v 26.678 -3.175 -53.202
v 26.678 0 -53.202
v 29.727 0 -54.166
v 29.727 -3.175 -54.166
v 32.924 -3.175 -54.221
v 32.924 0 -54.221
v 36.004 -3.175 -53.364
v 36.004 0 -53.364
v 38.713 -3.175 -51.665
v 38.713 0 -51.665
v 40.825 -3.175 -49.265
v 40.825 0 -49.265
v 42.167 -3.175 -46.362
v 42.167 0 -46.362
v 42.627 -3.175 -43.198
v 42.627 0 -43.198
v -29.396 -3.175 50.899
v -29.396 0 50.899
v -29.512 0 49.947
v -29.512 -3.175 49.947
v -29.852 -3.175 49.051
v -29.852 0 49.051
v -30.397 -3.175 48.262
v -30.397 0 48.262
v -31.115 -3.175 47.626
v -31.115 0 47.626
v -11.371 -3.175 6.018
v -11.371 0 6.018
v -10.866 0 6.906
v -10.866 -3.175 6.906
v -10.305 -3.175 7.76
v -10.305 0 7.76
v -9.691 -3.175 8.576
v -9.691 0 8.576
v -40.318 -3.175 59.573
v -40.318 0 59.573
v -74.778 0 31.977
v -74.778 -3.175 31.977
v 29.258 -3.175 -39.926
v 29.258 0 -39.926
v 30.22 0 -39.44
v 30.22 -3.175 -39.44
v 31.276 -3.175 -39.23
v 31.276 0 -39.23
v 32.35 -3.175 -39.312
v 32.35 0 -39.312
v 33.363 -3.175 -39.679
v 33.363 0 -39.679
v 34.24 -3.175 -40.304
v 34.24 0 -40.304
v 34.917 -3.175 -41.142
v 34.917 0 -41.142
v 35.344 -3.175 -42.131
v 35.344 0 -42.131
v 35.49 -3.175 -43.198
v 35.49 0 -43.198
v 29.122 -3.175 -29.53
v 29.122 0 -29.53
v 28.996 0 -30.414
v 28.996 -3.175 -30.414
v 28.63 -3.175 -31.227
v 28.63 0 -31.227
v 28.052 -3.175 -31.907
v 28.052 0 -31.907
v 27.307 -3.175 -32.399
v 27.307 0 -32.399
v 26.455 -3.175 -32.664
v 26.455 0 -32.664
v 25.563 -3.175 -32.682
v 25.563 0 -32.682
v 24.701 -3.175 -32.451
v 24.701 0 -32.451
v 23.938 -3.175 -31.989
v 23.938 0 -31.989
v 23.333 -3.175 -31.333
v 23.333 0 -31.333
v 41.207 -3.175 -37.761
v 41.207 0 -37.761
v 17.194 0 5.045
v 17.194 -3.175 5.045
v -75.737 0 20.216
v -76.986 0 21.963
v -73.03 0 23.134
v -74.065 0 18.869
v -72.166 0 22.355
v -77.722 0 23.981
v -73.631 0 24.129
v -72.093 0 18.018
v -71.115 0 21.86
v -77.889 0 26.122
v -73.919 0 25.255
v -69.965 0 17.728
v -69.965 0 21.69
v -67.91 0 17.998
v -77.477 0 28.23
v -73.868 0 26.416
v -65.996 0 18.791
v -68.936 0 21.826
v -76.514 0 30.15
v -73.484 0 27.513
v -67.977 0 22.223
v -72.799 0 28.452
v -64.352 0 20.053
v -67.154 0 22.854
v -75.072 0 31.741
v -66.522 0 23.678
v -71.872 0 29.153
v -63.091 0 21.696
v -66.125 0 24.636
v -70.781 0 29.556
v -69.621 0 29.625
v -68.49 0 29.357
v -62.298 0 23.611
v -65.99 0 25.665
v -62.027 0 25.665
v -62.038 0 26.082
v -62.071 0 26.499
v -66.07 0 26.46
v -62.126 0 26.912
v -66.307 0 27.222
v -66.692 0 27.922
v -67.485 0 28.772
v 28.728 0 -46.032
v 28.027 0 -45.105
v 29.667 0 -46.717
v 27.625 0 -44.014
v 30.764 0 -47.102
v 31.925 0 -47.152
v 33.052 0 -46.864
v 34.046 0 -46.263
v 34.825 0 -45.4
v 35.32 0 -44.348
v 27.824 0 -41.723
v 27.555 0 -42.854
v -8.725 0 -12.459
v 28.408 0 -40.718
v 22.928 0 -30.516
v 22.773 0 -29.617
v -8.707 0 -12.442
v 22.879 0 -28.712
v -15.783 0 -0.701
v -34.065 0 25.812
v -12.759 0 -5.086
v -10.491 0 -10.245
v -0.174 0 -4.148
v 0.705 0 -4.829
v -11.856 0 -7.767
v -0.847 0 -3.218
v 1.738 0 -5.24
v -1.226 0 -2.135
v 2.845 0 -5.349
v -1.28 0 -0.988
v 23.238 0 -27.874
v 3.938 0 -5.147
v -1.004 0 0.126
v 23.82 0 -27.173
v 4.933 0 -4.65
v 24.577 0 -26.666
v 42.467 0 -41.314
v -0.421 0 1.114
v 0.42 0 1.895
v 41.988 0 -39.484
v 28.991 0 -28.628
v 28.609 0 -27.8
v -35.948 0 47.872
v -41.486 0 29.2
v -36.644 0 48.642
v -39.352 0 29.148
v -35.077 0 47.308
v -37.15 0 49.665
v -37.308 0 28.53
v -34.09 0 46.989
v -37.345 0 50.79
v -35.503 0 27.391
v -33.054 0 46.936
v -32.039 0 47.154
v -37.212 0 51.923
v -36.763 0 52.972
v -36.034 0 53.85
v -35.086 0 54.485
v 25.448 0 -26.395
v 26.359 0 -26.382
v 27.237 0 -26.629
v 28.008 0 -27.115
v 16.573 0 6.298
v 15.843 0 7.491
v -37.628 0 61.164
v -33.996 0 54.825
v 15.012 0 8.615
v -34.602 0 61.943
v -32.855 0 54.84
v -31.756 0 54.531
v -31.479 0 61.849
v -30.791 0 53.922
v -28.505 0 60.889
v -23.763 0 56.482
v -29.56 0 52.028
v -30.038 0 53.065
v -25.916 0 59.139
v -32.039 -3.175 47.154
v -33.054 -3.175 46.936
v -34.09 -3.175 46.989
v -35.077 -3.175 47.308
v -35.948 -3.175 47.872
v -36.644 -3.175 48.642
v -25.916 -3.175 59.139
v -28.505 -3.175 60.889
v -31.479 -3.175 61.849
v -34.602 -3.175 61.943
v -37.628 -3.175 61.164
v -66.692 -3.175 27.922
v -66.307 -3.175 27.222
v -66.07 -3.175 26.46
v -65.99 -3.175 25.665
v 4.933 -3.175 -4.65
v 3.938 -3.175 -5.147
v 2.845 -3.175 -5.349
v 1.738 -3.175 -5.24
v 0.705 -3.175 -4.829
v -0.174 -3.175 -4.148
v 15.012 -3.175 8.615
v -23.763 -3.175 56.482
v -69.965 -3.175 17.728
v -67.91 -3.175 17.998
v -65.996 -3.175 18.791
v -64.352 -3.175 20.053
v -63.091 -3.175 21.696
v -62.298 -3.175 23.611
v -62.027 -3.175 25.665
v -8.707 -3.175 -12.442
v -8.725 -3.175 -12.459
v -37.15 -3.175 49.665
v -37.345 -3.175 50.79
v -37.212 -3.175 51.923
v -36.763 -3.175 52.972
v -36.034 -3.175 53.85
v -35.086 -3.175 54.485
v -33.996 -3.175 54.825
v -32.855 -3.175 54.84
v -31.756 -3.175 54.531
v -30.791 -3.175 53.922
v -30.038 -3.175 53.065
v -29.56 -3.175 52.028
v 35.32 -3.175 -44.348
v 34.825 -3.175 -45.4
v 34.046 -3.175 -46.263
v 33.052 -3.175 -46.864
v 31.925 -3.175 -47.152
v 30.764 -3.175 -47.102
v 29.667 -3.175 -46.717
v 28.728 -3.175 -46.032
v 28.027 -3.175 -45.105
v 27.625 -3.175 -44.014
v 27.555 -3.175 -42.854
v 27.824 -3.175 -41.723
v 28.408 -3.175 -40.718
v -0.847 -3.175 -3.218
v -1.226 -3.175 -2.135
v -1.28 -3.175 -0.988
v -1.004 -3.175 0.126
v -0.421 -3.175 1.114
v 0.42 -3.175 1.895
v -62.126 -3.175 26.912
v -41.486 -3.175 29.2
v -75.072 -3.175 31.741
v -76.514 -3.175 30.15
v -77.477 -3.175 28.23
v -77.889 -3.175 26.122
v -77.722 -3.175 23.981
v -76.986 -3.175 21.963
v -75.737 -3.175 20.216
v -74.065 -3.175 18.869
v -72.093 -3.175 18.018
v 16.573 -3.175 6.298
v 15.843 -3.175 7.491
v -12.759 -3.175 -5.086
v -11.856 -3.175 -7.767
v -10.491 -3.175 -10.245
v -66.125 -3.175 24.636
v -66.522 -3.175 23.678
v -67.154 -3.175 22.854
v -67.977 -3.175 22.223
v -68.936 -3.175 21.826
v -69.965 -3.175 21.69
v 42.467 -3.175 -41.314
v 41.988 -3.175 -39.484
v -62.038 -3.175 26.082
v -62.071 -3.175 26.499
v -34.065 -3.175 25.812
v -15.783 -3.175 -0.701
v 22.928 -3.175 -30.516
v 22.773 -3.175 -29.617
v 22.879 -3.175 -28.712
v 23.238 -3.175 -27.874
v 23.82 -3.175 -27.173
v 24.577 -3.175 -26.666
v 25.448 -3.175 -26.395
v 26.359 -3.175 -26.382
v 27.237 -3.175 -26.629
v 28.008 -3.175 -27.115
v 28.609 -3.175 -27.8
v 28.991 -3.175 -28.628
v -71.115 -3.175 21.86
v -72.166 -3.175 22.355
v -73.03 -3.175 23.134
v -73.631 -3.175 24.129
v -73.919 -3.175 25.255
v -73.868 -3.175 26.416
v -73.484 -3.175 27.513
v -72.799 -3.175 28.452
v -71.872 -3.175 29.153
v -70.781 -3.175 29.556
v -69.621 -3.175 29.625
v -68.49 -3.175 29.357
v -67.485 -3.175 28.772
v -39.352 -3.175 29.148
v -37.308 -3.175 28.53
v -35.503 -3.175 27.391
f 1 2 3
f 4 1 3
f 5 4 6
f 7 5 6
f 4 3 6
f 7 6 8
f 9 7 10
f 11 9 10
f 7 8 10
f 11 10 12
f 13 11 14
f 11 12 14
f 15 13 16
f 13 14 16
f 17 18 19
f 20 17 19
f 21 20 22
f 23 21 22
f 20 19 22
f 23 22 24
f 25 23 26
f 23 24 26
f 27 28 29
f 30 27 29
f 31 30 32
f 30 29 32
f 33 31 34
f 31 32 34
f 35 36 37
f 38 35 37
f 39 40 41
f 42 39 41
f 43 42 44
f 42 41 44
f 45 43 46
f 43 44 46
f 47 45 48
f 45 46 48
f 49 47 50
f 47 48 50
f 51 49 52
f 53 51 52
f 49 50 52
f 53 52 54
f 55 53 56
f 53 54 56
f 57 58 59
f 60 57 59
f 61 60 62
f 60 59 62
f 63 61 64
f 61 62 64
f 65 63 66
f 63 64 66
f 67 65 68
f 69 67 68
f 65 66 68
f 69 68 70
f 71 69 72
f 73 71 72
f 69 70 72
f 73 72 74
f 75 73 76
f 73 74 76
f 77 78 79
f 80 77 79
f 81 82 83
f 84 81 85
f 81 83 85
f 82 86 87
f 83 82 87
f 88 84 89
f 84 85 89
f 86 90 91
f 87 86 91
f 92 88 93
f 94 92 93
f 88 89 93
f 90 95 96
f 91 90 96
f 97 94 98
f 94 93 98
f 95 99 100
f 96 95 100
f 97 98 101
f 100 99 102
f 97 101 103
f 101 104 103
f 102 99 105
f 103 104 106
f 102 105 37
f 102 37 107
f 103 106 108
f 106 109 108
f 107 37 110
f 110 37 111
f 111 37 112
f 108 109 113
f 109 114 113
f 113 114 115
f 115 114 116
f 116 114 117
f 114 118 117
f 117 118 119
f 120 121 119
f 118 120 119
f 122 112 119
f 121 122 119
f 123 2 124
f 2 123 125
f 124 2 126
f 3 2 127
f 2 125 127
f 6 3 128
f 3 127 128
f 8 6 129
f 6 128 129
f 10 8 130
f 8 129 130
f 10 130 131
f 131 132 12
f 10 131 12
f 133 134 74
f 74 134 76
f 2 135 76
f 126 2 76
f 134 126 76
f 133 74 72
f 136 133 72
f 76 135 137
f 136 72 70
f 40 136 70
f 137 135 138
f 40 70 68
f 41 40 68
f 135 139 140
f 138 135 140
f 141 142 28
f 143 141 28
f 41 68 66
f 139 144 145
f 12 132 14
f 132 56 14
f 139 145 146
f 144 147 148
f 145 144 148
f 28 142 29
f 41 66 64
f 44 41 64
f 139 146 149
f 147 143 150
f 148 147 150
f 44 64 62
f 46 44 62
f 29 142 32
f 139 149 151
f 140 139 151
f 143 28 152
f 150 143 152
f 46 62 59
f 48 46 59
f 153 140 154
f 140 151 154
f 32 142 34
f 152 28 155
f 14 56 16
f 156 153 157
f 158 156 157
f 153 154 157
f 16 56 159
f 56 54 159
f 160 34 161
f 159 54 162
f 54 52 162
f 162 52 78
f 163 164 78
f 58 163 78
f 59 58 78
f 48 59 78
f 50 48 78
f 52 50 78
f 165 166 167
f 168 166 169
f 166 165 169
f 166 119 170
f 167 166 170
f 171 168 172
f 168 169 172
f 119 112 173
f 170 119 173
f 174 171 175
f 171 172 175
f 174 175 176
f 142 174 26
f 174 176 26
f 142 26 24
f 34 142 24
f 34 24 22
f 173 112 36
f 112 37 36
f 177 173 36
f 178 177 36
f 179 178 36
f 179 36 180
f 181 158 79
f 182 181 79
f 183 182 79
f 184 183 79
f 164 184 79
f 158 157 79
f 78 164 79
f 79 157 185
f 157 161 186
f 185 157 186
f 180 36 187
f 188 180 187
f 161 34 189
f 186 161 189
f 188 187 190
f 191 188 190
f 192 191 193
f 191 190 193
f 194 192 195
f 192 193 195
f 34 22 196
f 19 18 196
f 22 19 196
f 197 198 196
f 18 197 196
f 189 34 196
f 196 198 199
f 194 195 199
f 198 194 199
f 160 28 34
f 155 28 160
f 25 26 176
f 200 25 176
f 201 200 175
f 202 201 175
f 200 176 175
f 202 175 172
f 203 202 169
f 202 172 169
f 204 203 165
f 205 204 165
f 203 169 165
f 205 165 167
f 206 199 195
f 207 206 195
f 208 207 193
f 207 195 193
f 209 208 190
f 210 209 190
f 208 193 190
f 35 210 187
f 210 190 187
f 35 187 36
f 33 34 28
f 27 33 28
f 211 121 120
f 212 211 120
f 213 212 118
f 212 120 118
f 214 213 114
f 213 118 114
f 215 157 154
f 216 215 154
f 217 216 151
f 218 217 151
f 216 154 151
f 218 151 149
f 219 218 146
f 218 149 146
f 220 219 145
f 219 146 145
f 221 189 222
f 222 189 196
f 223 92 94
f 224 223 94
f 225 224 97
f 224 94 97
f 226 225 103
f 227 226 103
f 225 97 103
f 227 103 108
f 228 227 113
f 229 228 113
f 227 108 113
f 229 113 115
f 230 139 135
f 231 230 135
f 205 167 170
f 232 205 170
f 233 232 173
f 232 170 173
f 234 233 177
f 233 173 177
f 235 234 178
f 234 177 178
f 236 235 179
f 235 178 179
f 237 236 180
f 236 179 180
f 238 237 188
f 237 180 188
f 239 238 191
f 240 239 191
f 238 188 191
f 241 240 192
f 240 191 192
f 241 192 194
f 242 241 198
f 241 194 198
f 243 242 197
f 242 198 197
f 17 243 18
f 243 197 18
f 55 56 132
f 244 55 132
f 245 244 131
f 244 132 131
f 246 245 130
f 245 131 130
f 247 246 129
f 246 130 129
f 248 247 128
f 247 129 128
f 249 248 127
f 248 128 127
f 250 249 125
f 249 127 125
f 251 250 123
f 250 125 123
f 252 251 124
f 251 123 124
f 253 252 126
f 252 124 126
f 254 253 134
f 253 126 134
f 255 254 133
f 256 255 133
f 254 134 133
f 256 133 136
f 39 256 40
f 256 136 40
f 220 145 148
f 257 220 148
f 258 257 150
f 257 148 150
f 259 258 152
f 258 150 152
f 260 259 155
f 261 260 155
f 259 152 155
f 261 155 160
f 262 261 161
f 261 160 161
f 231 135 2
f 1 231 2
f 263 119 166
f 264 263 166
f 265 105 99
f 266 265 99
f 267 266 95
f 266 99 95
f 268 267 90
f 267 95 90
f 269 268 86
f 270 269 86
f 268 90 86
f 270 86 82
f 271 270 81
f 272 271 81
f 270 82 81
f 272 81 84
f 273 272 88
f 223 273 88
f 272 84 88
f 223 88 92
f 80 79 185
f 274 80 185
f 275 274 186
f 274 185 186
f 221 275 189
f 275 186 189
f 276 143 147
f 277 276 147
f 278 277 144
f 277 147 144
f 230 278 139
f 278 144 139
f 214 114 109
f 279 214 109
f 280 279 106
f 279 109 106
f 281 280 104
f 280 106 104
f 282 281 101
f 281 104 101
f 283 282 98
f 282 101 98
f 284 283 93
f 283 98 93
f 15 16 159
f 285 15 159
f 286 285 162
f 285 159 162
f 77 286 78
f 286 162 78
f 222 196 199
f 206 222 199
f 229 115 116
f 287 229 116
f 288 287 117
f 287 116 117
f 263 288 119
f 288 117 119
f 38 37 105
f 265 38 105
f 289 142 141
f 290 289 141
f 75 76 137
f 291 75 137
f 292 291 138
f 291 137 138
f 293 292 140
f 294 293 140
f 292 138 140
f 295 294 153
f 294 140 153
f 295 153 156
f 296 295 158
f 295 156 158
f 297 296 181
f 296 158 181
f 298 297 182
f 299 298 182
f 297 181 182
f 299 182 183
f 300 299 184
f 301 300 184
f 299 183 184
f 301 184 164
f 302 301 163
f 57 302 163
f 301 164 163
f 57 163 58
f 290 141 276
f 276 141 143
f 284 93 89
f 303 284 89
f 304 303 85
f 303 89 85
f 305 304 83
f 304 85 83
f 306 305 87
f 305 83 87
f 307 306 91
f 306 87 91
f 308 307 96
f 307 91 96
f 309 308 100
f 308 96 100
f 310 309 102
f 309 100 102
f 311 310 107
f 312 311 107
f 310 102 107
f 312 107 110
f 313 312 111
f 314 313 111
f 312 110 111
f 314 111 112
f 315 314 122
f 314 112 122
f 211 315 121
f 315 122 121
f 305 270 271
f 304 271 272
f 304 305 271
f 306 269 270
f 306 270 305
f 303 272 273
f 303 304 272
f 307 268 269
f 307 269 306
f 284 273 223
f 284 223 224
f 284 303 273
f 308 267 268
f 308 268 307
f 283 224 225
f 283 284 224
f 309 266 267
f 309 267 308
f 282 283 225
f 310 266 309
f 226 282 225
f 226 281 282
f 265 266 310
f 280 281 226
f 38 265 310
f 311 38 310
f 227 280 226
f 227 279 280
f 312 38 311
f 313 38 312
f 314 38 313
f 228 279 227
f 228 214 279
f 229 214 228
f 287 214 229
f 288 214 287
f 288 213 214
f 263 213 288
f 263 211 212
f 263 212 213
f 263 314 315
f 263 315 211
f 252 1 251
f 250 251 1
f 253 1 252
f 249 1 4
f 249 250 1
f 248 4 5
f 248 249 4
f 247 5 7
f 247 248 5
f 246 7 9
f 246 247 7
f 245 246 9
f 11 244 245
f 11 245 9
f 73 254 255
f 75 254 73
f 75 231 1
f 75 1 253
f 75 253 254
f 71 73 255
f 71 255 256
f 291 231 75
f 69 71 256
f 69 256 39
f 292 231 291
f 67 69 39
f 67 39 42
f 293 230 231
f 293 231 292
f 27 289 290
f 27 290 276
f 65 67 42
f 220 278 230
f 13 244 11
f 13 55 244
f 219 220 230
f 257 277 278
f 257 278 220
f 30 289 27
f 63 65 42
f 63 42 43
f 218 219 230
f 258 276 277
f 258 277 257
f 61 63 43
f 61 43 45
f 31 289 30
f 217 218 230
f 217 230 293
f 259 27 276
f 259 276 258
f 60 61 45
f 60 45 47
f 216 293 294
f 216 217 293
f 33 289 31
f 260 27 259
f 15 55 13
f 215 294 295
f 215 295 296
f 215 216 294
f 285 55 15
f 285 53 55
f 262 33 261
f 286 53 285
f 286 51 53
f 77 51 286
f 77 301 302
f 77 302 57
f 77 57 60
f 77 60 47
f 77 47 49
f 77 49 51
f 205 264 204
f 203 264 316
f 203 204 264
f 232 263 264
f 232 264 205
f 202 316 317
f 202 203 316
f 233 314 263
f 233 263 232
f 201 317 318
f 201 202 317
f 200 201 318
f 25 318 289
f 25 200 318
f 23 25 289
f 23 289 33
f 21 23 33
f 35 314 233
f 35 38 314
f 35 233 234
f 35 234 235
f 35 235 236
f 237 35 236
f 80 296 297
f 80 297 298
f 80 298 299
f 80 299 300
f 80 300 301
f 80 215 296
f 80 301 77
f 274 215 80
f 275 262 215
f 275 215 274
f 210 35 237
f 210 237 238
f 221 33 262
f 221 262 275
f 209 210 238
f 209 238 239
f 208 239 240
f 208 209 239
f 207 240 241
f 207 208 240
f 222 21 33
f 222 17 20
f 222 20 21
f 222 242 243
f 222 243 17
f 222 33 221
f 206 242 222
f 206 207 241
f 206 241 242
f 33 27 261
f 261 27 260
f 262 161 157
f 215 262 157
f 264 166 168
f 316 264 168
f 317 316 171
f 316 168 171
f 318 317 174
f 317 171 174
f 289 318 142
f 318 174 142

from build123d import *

# Parameters (mm, degrees)
F1_DEPTH = 3.175


# Not quite as in the source:
# - a feature names something its author has since deleted; it is built from what else it names


with BuildPart() as f1:
    # F0 (on Front) → F1 (new body)
    with BuildSketch(Plane.XZ):
        with BuildLine():
            ThreePointArc((41.2067680932, -37.761442646), (34.0261463641, -32.3730062039), (25.2065586875, -34.049743787))
            ThreePointArc((25.2065586875, -34.049743787), (20.9962687571, -39.6141258639), (20.9333080978, -46.5915842229))
            Line((20.9333080978, -46.5915842229), (26.6775649821, -53.2024105477))
            ThreePointArc((26.6775649821, -53.2024105477), (37.4197145601, -52.6119623059), (42.6274718911, -43.1980539644))
            ThreePointArc((42.6274718911, -43.1980539644), (42.2664308978, -40.3884658314), (41.2067680932, -37.761442646))
        make_face()
        with BuildLine():
            ThreePointArc((35.4900718911, -43.1980539644), (29.6668415528, -46.7174053624), (29.258362368, -39.9255727238))
            ThreePointArc((29.258362368, -39.9255727238), (33.3631022294, -39.6787025664), (35.4900718911, -43.1980539644))
        make_face(mode=Mode.SUBTRACT)
        with BuildLine():
            ThreePointArc((20.9333080978, -46.5915842229), (20.9962687571, -39.6141258639), (25.2065586875, -34.049743787))
            Line((25.2065586875, -34.049743787), (23.332877686, -31.3325763437))
            Line((23.332877686, -31.3325763437), (11.7179656145, -14.4889082319))
            Line((11.7179656145, -14.4889082319), (0.788153606, -23.4073638243))
            Line((0.788153606, -23.4073638243), (20.9333080978, -46.5915842229))
        make_face()
        with BuildLine():
            Line((23.332877686, -31.3325763437), (25.2065586875, -34.049743787))
            ThreePointArc((25.2065586875, -34.049743787), (34.0261463641, -32.3730062039), (41.2067680932, -37.761442646))
            Line((41.2067680932, -37.761442646), (17.1943117559, 5.0453389137))
            ThreePointArc((17.1943117559, 5.0453389137), (18.2085059877, 1.9049828695), (18.5515115318, -1.377207439))
            ThreePointArc((18.5515115318, -1.377207439), (17.0177668978, -8.1848516369), (12.7128948986, -13.6770706055))
            Line((12.7128948986, -13.6770706055), (11.7179656145, -14.4889082319))
            Line((11.7179656145, -14.4889082319), (23.332877686, -31.3325763437))
        make_face()
        with BuildLine():
            ThreePointArc((29.1216807586, -29.5301728102), (26.8905558151, -32.5616287109), (23.332877686, -31.3325763437))
            ThreePointArc((23.332877686, -31.3325763437), (25.0028057021, -26.4987169095), (29.1216807586, -29.5301728102))
        make_face(mode=Mode.SUBTRACT)
        with BuildLine():
            Line((0.788153606, -23.4073638243), (11.7179656145, -14.4889082319))
            Line((11.7179656145, -14.4889082319), (11.6885303941, -14.4462219782))
            ThreePointArc((11.6885303941, -14.4462219782), (1.1239010077, -17.1761006141), (-8.7072046251, -12.4418643003))
            Line((-8.7072046251, -12.4418643003), (-8.7249576565, -12.4591197552))
            Line((-8.7249576565, -12.4591197552), (0.788153606, -23.4073638243))
        make_face()
        with BuildLine():
            Line((11.6885303941, -14.4462219782), (11.7179656145, -14.4889082319))
            Line((11.7179656145, -14.4889082319), (12.7128948986, -13.6770706055))
            ThreePointArc((12.7128948986, -13.6770706055), (12.2084738339, -14.0719827293), (11.6885303941, -14.4462219782))
        make_face()
        with BuildLine():
            ThreePointArc((18.5515115318, -1.377207439), (18.2085059877, 1.9049828695), (17.1943117559, 5.0453389137))
            ThreePointArc((17.1943117559, 5.0453389137), (16.2212708068, 6.9025945623), (15.0119525687, 8.6154158115))
            ThreePointArc((15.0119525687, 8.6154158115), (4.9408722756, 14.3354720086), (-6.3355073305, 11.6918071002))
            Line((-6.3355073305, 11.6918071002), (0.4199020087, 1.8952738016))
            ThreePointArc((0.4199020087, 1.8952738016), (4.5246418701, 2.142143959), (6.6516115318, -1.377207439))
            ThreePointArc((6.6516115318, -1.377207439), (6.1958629298, -3.2253377773), (4.9331210549, -4.6496886796))
            Line((4.9331210549, -4.6496886796), (11.6885303941, -14.4462219782))
            ThreePointArc((11.6885303941, -14.4462219782), (12.2084738339, -14.0719827293), (12.7128948986, -13.6770706055))
            ThreePointArc((12.7128948986, -13.6770706055), (17.0177668978, -8.1848516369), (18.5515115318, -1.377207439))
        make_face()
        with BuildLine():
            ThreePointArc((-8.7072046251, -12.4418643003), (1.1239010077, -17.1761006141), (11.6885303941, -14.4462219782))
            Line((11.6885303941, -14.4462219782), (4.9331210549, -4.6496886796))
            ThreePointArc((4.9331210549, -4.6496886796), (2.2877378565, -5.33325029), (-0.1739709939, -4.147797517))
            Line((-0.1739709939, -4.147797517), (-8.7072046251, -12.4418643003))
        make_face()
        with BuildLine():
            ThreePointArc((-6.3355073305, 11.6918071002), (4.9408722756, 14.3354720086), (15.0119525687, 8.6154158115))
            Line((15.0119525687, 8.6154158115), (-23.7631885124, 56.4815721265))
            ThreePointArc((-23.7631885124, 56.4815721265), (-22.6416820928, 53.7897488967), (-22.2590639174, 50.8988507178))
            ThreePointArc((-22.2590639174, 50.8988507178), (-23.5331215108, 45.7323521683), (-27.0631507138, 41.7505405404))
            Line((-27.0631507138, 41.7505405404), (-6.3355073305, 11.6918071002))
        make_face()
        with BuildLine():
            Line((2.6765115318, -1.377207439), (4.9331210549, -4.6496886796))
            ThreePointArc((4.9331210549, -4.6496886796), (6.1958629298, -3.2253377773), (6.6516115318, -1.377207439))
            ThreePointArc((6.6516115318, -1.377207439), (4.5246418701, 2.142143959), (0.4199020087, 1.8952738016))
            Line((0.4199020087, 1.8952738016), (2.6765115318, -1.377207439))
        make_face()
        with BuildLine():
            ThreePointArc((-12.7591425966, -5.0861434898), (-11.2283909413, -9.0367969981), (-8.7072046251, -12.4418643003))
            Line((-8.7072046251, -12.4418643003), (-0.1739709939, -4.147797517))
            ThreePointArc((-0.1739709939, -4.147797517), (-1.2795313193, -0.9884337637), (0.4199020087, 1.8952738016))
            Line((0.4199020087, 1.8952738016), (-6.3355073305, 11.6918071002))
            ThreePointArc((-6.3355073305, 11.6918071002), (-8.12621733, 10.2553621026), (-9.6910264168, 8.5756630059))
            Line((-9.6910264168, 8.5756630059), (-11.3706653491, 6.0182267388))
            ThreePointArc((-11.3706653491, 6.0182267388), (-13.0758245053, 0.5924459256), (-12.7591425966, -5.0861434898))
        make_face()
        with BuildLine():
            ThreePointArc((-9.6910264168, 8.5756630059), (-8.12621733, 10.2553621026), (-6.3355073305, 11.6918071002))
            Line((-6.3355073305, 11.6918071002), (-27.0631507138, 41.7505405404))
            ThreePointArc((-27.0631507138, 41.7505405404), (-35.3796743255, 39.9692968001), (-42.5198740948, 44.5904375142))
            Line((-42.5198740948, 44.5904375142), (-63.4302973575, 30.1712073345))
            ThreePointArc((-63.4302973575, 30.1712073345), (-62.5957178566, 28.6148532084), (-62.125916075, 26.9124879729))
            Line((-62.125916075, 26.9124879729), (-41.4863105467, 29.2003405071))
            ThreePointArc((-41.4863105467, 29.2003405071), (-37.3081114888, 28.5304448001), (-34.0654515171, 25.8117568934))
            Line((-34.0654515171, 25.8117568934), (-15.783328424, -0.7005414231))
            Line((-15.783328424, -0.7005414231), (-11.3706653491, 6.0182267388))
            ThreePointArc((-11.3706653491, 6.0182267388), (-10.5926033575, 7.337505124), (-9.6910264168, 8.5756630059))
        make_face()
        with BuildLine():
            ThreePointArc((-22.2590639174, 50.8988507178), (-22.6416820928, 53.7897488967), (-23.7631885124, 56.4815721265))
            Line((-23.7631885124, 56.4815721265), (-25.9160326978, 59.1391608141))
            ThreePointArc((-25.9160326978, 59.1391608141), (-33.0370839347, 62.0063157477), (-40.3177534576, 59.572840983))
            ThreePointArc((-40.3177534576, 59.572840983), (-44.3659412857, 52.514809422), (-42.5198740948, 44.5904375142))
            Line((-42.5198740948, 44.5904375142), (-36.644045158, 48.6422411947))
            ThreePointArc((-36.644045158, 48.6422411947), (-34.5532956616, 54.6942334514), (-29.3964639174, 50.8988507178))
            ThreePointArc((-29.3964639174, 50.8988507178), (-29.8522125194, 49.0507203795), (-31.1149543943, 47.6263694772))
            Line((-31.1149543943, 47.6263694772), (-27.0631507138, 41.7505405404))
            ThreePointArc((-27.0631507138, 41.7505405404), (-23.5331215108, 45.7323521683), (-22.2590639174, 50.8988507178))
        make_face()
        with BuildLine():
            Line((-15.783328424, -0.7005414231), (-12.7591425966, -5.0861434898))
            ThreePointArc((-12.7591425966, -5.0861434898), (-13.0758245053, 0.5924459256), (-11.3706653491, 6.0182267388))
            Line((-11.3706653491, 6.0182267388), (-15.783328424, -0.7005414231))
        make_face()
        with BuildLine():
            ThreePointArc((-42.5198740948, 44.5904375142), (-35.3796743255, 39.9692968001), (-27.0631507138, 41.7505405404))
            Line((-27.0631507138, 41.7505405404), (-31.1149543943, 47.6263694772))
            ThreePointArc((-31.1149543943, 47.6263694772), (-34.0898936977, 46.989193145), (-36.644045158, 48.6422411947))
            Line((-36.644045158, 48.6422411947), (-42.5198740948, 44.5904375142))
        make_face()
        with BuildLine():
            Line((-63.4302973575, 30.1712073345), (-42.5198740948, 44.5904375142))
            ThreePointArc((-42.5198740948, 44.5904375142), (-44.3659412857, 52.514809422), (-40.3177534576, 59.572840983))
            Line((-40.3177534576, 59.572840983), (-74.7776425006, 31.9771308762))
            ThreePointArc((-74.7776425006, 31.9771308762), (-68.717256497, 33.5040453897), (-63.4302973575, 30.1712073345))
        make_face()
        with BuildLine():
            ThreePointArc((-62.125916075, 26.9124879729), (-62.5957178566, 28.6148532084), (-63.4302973575, 30.1712073345))
            Line((-63.4302973575, 30.1712073345), (-66.6923233865, 27.9218074265))
            ThreePointArc((-66.6923233865, 27.9218074265), (-66.1694218935, 26.8469296476), (-65.9897046271, 25.6651979034))
            ThreePointArc((-65.9897046271, 25.6651979034), (-67.1539844612, 22.8543777375), (-69.9648046271, 21.6900979034))
            Line((-69.9648046271, 21.6900979034), (-69.9648046271, 17.7276979034))
            ThreePointArc((-69.9648046271, 17.7276979034), (-64.3521445515, 20.0525378277), (-62.0273046271, 25.6651979034))
            ThreePointArc((-62.0273046271, 25.6651979034), (-62.0519958928, 26.2907889709), (-62.125916075, 26.9124879729))
        make_face()
        with BuildLine():
            Line((-66.6923233865, 27.9218074265), (-63.4302973575, 30.1712073345))
            ThreePointArc((-63.4302973575, 30.1712073345), (-68.717256497, 33.5040453897), (-74.7776425006, 31.9771308762))
            Line((-74.7776425006, 31.9771308762), (-75.0722889717, 31.7411760073))
            ThreePointArc((-75.0722889717, 31.7411760073), (-77.4224175981, 22.9471259719), (-69.9648046271, 17.7276979034))
            Line((-69.9648046271, 17.7276979034), (-69.9648046271, 21.6900979034))
            ThreePointArc((-69.9648046271, 21.6900979034), (-73.4841560252, 27.5133282417), (-66.6923233865, 27.9218074265))
        make_face()
    extrude(amount=F1_DEPTH)


solid = f1.part
